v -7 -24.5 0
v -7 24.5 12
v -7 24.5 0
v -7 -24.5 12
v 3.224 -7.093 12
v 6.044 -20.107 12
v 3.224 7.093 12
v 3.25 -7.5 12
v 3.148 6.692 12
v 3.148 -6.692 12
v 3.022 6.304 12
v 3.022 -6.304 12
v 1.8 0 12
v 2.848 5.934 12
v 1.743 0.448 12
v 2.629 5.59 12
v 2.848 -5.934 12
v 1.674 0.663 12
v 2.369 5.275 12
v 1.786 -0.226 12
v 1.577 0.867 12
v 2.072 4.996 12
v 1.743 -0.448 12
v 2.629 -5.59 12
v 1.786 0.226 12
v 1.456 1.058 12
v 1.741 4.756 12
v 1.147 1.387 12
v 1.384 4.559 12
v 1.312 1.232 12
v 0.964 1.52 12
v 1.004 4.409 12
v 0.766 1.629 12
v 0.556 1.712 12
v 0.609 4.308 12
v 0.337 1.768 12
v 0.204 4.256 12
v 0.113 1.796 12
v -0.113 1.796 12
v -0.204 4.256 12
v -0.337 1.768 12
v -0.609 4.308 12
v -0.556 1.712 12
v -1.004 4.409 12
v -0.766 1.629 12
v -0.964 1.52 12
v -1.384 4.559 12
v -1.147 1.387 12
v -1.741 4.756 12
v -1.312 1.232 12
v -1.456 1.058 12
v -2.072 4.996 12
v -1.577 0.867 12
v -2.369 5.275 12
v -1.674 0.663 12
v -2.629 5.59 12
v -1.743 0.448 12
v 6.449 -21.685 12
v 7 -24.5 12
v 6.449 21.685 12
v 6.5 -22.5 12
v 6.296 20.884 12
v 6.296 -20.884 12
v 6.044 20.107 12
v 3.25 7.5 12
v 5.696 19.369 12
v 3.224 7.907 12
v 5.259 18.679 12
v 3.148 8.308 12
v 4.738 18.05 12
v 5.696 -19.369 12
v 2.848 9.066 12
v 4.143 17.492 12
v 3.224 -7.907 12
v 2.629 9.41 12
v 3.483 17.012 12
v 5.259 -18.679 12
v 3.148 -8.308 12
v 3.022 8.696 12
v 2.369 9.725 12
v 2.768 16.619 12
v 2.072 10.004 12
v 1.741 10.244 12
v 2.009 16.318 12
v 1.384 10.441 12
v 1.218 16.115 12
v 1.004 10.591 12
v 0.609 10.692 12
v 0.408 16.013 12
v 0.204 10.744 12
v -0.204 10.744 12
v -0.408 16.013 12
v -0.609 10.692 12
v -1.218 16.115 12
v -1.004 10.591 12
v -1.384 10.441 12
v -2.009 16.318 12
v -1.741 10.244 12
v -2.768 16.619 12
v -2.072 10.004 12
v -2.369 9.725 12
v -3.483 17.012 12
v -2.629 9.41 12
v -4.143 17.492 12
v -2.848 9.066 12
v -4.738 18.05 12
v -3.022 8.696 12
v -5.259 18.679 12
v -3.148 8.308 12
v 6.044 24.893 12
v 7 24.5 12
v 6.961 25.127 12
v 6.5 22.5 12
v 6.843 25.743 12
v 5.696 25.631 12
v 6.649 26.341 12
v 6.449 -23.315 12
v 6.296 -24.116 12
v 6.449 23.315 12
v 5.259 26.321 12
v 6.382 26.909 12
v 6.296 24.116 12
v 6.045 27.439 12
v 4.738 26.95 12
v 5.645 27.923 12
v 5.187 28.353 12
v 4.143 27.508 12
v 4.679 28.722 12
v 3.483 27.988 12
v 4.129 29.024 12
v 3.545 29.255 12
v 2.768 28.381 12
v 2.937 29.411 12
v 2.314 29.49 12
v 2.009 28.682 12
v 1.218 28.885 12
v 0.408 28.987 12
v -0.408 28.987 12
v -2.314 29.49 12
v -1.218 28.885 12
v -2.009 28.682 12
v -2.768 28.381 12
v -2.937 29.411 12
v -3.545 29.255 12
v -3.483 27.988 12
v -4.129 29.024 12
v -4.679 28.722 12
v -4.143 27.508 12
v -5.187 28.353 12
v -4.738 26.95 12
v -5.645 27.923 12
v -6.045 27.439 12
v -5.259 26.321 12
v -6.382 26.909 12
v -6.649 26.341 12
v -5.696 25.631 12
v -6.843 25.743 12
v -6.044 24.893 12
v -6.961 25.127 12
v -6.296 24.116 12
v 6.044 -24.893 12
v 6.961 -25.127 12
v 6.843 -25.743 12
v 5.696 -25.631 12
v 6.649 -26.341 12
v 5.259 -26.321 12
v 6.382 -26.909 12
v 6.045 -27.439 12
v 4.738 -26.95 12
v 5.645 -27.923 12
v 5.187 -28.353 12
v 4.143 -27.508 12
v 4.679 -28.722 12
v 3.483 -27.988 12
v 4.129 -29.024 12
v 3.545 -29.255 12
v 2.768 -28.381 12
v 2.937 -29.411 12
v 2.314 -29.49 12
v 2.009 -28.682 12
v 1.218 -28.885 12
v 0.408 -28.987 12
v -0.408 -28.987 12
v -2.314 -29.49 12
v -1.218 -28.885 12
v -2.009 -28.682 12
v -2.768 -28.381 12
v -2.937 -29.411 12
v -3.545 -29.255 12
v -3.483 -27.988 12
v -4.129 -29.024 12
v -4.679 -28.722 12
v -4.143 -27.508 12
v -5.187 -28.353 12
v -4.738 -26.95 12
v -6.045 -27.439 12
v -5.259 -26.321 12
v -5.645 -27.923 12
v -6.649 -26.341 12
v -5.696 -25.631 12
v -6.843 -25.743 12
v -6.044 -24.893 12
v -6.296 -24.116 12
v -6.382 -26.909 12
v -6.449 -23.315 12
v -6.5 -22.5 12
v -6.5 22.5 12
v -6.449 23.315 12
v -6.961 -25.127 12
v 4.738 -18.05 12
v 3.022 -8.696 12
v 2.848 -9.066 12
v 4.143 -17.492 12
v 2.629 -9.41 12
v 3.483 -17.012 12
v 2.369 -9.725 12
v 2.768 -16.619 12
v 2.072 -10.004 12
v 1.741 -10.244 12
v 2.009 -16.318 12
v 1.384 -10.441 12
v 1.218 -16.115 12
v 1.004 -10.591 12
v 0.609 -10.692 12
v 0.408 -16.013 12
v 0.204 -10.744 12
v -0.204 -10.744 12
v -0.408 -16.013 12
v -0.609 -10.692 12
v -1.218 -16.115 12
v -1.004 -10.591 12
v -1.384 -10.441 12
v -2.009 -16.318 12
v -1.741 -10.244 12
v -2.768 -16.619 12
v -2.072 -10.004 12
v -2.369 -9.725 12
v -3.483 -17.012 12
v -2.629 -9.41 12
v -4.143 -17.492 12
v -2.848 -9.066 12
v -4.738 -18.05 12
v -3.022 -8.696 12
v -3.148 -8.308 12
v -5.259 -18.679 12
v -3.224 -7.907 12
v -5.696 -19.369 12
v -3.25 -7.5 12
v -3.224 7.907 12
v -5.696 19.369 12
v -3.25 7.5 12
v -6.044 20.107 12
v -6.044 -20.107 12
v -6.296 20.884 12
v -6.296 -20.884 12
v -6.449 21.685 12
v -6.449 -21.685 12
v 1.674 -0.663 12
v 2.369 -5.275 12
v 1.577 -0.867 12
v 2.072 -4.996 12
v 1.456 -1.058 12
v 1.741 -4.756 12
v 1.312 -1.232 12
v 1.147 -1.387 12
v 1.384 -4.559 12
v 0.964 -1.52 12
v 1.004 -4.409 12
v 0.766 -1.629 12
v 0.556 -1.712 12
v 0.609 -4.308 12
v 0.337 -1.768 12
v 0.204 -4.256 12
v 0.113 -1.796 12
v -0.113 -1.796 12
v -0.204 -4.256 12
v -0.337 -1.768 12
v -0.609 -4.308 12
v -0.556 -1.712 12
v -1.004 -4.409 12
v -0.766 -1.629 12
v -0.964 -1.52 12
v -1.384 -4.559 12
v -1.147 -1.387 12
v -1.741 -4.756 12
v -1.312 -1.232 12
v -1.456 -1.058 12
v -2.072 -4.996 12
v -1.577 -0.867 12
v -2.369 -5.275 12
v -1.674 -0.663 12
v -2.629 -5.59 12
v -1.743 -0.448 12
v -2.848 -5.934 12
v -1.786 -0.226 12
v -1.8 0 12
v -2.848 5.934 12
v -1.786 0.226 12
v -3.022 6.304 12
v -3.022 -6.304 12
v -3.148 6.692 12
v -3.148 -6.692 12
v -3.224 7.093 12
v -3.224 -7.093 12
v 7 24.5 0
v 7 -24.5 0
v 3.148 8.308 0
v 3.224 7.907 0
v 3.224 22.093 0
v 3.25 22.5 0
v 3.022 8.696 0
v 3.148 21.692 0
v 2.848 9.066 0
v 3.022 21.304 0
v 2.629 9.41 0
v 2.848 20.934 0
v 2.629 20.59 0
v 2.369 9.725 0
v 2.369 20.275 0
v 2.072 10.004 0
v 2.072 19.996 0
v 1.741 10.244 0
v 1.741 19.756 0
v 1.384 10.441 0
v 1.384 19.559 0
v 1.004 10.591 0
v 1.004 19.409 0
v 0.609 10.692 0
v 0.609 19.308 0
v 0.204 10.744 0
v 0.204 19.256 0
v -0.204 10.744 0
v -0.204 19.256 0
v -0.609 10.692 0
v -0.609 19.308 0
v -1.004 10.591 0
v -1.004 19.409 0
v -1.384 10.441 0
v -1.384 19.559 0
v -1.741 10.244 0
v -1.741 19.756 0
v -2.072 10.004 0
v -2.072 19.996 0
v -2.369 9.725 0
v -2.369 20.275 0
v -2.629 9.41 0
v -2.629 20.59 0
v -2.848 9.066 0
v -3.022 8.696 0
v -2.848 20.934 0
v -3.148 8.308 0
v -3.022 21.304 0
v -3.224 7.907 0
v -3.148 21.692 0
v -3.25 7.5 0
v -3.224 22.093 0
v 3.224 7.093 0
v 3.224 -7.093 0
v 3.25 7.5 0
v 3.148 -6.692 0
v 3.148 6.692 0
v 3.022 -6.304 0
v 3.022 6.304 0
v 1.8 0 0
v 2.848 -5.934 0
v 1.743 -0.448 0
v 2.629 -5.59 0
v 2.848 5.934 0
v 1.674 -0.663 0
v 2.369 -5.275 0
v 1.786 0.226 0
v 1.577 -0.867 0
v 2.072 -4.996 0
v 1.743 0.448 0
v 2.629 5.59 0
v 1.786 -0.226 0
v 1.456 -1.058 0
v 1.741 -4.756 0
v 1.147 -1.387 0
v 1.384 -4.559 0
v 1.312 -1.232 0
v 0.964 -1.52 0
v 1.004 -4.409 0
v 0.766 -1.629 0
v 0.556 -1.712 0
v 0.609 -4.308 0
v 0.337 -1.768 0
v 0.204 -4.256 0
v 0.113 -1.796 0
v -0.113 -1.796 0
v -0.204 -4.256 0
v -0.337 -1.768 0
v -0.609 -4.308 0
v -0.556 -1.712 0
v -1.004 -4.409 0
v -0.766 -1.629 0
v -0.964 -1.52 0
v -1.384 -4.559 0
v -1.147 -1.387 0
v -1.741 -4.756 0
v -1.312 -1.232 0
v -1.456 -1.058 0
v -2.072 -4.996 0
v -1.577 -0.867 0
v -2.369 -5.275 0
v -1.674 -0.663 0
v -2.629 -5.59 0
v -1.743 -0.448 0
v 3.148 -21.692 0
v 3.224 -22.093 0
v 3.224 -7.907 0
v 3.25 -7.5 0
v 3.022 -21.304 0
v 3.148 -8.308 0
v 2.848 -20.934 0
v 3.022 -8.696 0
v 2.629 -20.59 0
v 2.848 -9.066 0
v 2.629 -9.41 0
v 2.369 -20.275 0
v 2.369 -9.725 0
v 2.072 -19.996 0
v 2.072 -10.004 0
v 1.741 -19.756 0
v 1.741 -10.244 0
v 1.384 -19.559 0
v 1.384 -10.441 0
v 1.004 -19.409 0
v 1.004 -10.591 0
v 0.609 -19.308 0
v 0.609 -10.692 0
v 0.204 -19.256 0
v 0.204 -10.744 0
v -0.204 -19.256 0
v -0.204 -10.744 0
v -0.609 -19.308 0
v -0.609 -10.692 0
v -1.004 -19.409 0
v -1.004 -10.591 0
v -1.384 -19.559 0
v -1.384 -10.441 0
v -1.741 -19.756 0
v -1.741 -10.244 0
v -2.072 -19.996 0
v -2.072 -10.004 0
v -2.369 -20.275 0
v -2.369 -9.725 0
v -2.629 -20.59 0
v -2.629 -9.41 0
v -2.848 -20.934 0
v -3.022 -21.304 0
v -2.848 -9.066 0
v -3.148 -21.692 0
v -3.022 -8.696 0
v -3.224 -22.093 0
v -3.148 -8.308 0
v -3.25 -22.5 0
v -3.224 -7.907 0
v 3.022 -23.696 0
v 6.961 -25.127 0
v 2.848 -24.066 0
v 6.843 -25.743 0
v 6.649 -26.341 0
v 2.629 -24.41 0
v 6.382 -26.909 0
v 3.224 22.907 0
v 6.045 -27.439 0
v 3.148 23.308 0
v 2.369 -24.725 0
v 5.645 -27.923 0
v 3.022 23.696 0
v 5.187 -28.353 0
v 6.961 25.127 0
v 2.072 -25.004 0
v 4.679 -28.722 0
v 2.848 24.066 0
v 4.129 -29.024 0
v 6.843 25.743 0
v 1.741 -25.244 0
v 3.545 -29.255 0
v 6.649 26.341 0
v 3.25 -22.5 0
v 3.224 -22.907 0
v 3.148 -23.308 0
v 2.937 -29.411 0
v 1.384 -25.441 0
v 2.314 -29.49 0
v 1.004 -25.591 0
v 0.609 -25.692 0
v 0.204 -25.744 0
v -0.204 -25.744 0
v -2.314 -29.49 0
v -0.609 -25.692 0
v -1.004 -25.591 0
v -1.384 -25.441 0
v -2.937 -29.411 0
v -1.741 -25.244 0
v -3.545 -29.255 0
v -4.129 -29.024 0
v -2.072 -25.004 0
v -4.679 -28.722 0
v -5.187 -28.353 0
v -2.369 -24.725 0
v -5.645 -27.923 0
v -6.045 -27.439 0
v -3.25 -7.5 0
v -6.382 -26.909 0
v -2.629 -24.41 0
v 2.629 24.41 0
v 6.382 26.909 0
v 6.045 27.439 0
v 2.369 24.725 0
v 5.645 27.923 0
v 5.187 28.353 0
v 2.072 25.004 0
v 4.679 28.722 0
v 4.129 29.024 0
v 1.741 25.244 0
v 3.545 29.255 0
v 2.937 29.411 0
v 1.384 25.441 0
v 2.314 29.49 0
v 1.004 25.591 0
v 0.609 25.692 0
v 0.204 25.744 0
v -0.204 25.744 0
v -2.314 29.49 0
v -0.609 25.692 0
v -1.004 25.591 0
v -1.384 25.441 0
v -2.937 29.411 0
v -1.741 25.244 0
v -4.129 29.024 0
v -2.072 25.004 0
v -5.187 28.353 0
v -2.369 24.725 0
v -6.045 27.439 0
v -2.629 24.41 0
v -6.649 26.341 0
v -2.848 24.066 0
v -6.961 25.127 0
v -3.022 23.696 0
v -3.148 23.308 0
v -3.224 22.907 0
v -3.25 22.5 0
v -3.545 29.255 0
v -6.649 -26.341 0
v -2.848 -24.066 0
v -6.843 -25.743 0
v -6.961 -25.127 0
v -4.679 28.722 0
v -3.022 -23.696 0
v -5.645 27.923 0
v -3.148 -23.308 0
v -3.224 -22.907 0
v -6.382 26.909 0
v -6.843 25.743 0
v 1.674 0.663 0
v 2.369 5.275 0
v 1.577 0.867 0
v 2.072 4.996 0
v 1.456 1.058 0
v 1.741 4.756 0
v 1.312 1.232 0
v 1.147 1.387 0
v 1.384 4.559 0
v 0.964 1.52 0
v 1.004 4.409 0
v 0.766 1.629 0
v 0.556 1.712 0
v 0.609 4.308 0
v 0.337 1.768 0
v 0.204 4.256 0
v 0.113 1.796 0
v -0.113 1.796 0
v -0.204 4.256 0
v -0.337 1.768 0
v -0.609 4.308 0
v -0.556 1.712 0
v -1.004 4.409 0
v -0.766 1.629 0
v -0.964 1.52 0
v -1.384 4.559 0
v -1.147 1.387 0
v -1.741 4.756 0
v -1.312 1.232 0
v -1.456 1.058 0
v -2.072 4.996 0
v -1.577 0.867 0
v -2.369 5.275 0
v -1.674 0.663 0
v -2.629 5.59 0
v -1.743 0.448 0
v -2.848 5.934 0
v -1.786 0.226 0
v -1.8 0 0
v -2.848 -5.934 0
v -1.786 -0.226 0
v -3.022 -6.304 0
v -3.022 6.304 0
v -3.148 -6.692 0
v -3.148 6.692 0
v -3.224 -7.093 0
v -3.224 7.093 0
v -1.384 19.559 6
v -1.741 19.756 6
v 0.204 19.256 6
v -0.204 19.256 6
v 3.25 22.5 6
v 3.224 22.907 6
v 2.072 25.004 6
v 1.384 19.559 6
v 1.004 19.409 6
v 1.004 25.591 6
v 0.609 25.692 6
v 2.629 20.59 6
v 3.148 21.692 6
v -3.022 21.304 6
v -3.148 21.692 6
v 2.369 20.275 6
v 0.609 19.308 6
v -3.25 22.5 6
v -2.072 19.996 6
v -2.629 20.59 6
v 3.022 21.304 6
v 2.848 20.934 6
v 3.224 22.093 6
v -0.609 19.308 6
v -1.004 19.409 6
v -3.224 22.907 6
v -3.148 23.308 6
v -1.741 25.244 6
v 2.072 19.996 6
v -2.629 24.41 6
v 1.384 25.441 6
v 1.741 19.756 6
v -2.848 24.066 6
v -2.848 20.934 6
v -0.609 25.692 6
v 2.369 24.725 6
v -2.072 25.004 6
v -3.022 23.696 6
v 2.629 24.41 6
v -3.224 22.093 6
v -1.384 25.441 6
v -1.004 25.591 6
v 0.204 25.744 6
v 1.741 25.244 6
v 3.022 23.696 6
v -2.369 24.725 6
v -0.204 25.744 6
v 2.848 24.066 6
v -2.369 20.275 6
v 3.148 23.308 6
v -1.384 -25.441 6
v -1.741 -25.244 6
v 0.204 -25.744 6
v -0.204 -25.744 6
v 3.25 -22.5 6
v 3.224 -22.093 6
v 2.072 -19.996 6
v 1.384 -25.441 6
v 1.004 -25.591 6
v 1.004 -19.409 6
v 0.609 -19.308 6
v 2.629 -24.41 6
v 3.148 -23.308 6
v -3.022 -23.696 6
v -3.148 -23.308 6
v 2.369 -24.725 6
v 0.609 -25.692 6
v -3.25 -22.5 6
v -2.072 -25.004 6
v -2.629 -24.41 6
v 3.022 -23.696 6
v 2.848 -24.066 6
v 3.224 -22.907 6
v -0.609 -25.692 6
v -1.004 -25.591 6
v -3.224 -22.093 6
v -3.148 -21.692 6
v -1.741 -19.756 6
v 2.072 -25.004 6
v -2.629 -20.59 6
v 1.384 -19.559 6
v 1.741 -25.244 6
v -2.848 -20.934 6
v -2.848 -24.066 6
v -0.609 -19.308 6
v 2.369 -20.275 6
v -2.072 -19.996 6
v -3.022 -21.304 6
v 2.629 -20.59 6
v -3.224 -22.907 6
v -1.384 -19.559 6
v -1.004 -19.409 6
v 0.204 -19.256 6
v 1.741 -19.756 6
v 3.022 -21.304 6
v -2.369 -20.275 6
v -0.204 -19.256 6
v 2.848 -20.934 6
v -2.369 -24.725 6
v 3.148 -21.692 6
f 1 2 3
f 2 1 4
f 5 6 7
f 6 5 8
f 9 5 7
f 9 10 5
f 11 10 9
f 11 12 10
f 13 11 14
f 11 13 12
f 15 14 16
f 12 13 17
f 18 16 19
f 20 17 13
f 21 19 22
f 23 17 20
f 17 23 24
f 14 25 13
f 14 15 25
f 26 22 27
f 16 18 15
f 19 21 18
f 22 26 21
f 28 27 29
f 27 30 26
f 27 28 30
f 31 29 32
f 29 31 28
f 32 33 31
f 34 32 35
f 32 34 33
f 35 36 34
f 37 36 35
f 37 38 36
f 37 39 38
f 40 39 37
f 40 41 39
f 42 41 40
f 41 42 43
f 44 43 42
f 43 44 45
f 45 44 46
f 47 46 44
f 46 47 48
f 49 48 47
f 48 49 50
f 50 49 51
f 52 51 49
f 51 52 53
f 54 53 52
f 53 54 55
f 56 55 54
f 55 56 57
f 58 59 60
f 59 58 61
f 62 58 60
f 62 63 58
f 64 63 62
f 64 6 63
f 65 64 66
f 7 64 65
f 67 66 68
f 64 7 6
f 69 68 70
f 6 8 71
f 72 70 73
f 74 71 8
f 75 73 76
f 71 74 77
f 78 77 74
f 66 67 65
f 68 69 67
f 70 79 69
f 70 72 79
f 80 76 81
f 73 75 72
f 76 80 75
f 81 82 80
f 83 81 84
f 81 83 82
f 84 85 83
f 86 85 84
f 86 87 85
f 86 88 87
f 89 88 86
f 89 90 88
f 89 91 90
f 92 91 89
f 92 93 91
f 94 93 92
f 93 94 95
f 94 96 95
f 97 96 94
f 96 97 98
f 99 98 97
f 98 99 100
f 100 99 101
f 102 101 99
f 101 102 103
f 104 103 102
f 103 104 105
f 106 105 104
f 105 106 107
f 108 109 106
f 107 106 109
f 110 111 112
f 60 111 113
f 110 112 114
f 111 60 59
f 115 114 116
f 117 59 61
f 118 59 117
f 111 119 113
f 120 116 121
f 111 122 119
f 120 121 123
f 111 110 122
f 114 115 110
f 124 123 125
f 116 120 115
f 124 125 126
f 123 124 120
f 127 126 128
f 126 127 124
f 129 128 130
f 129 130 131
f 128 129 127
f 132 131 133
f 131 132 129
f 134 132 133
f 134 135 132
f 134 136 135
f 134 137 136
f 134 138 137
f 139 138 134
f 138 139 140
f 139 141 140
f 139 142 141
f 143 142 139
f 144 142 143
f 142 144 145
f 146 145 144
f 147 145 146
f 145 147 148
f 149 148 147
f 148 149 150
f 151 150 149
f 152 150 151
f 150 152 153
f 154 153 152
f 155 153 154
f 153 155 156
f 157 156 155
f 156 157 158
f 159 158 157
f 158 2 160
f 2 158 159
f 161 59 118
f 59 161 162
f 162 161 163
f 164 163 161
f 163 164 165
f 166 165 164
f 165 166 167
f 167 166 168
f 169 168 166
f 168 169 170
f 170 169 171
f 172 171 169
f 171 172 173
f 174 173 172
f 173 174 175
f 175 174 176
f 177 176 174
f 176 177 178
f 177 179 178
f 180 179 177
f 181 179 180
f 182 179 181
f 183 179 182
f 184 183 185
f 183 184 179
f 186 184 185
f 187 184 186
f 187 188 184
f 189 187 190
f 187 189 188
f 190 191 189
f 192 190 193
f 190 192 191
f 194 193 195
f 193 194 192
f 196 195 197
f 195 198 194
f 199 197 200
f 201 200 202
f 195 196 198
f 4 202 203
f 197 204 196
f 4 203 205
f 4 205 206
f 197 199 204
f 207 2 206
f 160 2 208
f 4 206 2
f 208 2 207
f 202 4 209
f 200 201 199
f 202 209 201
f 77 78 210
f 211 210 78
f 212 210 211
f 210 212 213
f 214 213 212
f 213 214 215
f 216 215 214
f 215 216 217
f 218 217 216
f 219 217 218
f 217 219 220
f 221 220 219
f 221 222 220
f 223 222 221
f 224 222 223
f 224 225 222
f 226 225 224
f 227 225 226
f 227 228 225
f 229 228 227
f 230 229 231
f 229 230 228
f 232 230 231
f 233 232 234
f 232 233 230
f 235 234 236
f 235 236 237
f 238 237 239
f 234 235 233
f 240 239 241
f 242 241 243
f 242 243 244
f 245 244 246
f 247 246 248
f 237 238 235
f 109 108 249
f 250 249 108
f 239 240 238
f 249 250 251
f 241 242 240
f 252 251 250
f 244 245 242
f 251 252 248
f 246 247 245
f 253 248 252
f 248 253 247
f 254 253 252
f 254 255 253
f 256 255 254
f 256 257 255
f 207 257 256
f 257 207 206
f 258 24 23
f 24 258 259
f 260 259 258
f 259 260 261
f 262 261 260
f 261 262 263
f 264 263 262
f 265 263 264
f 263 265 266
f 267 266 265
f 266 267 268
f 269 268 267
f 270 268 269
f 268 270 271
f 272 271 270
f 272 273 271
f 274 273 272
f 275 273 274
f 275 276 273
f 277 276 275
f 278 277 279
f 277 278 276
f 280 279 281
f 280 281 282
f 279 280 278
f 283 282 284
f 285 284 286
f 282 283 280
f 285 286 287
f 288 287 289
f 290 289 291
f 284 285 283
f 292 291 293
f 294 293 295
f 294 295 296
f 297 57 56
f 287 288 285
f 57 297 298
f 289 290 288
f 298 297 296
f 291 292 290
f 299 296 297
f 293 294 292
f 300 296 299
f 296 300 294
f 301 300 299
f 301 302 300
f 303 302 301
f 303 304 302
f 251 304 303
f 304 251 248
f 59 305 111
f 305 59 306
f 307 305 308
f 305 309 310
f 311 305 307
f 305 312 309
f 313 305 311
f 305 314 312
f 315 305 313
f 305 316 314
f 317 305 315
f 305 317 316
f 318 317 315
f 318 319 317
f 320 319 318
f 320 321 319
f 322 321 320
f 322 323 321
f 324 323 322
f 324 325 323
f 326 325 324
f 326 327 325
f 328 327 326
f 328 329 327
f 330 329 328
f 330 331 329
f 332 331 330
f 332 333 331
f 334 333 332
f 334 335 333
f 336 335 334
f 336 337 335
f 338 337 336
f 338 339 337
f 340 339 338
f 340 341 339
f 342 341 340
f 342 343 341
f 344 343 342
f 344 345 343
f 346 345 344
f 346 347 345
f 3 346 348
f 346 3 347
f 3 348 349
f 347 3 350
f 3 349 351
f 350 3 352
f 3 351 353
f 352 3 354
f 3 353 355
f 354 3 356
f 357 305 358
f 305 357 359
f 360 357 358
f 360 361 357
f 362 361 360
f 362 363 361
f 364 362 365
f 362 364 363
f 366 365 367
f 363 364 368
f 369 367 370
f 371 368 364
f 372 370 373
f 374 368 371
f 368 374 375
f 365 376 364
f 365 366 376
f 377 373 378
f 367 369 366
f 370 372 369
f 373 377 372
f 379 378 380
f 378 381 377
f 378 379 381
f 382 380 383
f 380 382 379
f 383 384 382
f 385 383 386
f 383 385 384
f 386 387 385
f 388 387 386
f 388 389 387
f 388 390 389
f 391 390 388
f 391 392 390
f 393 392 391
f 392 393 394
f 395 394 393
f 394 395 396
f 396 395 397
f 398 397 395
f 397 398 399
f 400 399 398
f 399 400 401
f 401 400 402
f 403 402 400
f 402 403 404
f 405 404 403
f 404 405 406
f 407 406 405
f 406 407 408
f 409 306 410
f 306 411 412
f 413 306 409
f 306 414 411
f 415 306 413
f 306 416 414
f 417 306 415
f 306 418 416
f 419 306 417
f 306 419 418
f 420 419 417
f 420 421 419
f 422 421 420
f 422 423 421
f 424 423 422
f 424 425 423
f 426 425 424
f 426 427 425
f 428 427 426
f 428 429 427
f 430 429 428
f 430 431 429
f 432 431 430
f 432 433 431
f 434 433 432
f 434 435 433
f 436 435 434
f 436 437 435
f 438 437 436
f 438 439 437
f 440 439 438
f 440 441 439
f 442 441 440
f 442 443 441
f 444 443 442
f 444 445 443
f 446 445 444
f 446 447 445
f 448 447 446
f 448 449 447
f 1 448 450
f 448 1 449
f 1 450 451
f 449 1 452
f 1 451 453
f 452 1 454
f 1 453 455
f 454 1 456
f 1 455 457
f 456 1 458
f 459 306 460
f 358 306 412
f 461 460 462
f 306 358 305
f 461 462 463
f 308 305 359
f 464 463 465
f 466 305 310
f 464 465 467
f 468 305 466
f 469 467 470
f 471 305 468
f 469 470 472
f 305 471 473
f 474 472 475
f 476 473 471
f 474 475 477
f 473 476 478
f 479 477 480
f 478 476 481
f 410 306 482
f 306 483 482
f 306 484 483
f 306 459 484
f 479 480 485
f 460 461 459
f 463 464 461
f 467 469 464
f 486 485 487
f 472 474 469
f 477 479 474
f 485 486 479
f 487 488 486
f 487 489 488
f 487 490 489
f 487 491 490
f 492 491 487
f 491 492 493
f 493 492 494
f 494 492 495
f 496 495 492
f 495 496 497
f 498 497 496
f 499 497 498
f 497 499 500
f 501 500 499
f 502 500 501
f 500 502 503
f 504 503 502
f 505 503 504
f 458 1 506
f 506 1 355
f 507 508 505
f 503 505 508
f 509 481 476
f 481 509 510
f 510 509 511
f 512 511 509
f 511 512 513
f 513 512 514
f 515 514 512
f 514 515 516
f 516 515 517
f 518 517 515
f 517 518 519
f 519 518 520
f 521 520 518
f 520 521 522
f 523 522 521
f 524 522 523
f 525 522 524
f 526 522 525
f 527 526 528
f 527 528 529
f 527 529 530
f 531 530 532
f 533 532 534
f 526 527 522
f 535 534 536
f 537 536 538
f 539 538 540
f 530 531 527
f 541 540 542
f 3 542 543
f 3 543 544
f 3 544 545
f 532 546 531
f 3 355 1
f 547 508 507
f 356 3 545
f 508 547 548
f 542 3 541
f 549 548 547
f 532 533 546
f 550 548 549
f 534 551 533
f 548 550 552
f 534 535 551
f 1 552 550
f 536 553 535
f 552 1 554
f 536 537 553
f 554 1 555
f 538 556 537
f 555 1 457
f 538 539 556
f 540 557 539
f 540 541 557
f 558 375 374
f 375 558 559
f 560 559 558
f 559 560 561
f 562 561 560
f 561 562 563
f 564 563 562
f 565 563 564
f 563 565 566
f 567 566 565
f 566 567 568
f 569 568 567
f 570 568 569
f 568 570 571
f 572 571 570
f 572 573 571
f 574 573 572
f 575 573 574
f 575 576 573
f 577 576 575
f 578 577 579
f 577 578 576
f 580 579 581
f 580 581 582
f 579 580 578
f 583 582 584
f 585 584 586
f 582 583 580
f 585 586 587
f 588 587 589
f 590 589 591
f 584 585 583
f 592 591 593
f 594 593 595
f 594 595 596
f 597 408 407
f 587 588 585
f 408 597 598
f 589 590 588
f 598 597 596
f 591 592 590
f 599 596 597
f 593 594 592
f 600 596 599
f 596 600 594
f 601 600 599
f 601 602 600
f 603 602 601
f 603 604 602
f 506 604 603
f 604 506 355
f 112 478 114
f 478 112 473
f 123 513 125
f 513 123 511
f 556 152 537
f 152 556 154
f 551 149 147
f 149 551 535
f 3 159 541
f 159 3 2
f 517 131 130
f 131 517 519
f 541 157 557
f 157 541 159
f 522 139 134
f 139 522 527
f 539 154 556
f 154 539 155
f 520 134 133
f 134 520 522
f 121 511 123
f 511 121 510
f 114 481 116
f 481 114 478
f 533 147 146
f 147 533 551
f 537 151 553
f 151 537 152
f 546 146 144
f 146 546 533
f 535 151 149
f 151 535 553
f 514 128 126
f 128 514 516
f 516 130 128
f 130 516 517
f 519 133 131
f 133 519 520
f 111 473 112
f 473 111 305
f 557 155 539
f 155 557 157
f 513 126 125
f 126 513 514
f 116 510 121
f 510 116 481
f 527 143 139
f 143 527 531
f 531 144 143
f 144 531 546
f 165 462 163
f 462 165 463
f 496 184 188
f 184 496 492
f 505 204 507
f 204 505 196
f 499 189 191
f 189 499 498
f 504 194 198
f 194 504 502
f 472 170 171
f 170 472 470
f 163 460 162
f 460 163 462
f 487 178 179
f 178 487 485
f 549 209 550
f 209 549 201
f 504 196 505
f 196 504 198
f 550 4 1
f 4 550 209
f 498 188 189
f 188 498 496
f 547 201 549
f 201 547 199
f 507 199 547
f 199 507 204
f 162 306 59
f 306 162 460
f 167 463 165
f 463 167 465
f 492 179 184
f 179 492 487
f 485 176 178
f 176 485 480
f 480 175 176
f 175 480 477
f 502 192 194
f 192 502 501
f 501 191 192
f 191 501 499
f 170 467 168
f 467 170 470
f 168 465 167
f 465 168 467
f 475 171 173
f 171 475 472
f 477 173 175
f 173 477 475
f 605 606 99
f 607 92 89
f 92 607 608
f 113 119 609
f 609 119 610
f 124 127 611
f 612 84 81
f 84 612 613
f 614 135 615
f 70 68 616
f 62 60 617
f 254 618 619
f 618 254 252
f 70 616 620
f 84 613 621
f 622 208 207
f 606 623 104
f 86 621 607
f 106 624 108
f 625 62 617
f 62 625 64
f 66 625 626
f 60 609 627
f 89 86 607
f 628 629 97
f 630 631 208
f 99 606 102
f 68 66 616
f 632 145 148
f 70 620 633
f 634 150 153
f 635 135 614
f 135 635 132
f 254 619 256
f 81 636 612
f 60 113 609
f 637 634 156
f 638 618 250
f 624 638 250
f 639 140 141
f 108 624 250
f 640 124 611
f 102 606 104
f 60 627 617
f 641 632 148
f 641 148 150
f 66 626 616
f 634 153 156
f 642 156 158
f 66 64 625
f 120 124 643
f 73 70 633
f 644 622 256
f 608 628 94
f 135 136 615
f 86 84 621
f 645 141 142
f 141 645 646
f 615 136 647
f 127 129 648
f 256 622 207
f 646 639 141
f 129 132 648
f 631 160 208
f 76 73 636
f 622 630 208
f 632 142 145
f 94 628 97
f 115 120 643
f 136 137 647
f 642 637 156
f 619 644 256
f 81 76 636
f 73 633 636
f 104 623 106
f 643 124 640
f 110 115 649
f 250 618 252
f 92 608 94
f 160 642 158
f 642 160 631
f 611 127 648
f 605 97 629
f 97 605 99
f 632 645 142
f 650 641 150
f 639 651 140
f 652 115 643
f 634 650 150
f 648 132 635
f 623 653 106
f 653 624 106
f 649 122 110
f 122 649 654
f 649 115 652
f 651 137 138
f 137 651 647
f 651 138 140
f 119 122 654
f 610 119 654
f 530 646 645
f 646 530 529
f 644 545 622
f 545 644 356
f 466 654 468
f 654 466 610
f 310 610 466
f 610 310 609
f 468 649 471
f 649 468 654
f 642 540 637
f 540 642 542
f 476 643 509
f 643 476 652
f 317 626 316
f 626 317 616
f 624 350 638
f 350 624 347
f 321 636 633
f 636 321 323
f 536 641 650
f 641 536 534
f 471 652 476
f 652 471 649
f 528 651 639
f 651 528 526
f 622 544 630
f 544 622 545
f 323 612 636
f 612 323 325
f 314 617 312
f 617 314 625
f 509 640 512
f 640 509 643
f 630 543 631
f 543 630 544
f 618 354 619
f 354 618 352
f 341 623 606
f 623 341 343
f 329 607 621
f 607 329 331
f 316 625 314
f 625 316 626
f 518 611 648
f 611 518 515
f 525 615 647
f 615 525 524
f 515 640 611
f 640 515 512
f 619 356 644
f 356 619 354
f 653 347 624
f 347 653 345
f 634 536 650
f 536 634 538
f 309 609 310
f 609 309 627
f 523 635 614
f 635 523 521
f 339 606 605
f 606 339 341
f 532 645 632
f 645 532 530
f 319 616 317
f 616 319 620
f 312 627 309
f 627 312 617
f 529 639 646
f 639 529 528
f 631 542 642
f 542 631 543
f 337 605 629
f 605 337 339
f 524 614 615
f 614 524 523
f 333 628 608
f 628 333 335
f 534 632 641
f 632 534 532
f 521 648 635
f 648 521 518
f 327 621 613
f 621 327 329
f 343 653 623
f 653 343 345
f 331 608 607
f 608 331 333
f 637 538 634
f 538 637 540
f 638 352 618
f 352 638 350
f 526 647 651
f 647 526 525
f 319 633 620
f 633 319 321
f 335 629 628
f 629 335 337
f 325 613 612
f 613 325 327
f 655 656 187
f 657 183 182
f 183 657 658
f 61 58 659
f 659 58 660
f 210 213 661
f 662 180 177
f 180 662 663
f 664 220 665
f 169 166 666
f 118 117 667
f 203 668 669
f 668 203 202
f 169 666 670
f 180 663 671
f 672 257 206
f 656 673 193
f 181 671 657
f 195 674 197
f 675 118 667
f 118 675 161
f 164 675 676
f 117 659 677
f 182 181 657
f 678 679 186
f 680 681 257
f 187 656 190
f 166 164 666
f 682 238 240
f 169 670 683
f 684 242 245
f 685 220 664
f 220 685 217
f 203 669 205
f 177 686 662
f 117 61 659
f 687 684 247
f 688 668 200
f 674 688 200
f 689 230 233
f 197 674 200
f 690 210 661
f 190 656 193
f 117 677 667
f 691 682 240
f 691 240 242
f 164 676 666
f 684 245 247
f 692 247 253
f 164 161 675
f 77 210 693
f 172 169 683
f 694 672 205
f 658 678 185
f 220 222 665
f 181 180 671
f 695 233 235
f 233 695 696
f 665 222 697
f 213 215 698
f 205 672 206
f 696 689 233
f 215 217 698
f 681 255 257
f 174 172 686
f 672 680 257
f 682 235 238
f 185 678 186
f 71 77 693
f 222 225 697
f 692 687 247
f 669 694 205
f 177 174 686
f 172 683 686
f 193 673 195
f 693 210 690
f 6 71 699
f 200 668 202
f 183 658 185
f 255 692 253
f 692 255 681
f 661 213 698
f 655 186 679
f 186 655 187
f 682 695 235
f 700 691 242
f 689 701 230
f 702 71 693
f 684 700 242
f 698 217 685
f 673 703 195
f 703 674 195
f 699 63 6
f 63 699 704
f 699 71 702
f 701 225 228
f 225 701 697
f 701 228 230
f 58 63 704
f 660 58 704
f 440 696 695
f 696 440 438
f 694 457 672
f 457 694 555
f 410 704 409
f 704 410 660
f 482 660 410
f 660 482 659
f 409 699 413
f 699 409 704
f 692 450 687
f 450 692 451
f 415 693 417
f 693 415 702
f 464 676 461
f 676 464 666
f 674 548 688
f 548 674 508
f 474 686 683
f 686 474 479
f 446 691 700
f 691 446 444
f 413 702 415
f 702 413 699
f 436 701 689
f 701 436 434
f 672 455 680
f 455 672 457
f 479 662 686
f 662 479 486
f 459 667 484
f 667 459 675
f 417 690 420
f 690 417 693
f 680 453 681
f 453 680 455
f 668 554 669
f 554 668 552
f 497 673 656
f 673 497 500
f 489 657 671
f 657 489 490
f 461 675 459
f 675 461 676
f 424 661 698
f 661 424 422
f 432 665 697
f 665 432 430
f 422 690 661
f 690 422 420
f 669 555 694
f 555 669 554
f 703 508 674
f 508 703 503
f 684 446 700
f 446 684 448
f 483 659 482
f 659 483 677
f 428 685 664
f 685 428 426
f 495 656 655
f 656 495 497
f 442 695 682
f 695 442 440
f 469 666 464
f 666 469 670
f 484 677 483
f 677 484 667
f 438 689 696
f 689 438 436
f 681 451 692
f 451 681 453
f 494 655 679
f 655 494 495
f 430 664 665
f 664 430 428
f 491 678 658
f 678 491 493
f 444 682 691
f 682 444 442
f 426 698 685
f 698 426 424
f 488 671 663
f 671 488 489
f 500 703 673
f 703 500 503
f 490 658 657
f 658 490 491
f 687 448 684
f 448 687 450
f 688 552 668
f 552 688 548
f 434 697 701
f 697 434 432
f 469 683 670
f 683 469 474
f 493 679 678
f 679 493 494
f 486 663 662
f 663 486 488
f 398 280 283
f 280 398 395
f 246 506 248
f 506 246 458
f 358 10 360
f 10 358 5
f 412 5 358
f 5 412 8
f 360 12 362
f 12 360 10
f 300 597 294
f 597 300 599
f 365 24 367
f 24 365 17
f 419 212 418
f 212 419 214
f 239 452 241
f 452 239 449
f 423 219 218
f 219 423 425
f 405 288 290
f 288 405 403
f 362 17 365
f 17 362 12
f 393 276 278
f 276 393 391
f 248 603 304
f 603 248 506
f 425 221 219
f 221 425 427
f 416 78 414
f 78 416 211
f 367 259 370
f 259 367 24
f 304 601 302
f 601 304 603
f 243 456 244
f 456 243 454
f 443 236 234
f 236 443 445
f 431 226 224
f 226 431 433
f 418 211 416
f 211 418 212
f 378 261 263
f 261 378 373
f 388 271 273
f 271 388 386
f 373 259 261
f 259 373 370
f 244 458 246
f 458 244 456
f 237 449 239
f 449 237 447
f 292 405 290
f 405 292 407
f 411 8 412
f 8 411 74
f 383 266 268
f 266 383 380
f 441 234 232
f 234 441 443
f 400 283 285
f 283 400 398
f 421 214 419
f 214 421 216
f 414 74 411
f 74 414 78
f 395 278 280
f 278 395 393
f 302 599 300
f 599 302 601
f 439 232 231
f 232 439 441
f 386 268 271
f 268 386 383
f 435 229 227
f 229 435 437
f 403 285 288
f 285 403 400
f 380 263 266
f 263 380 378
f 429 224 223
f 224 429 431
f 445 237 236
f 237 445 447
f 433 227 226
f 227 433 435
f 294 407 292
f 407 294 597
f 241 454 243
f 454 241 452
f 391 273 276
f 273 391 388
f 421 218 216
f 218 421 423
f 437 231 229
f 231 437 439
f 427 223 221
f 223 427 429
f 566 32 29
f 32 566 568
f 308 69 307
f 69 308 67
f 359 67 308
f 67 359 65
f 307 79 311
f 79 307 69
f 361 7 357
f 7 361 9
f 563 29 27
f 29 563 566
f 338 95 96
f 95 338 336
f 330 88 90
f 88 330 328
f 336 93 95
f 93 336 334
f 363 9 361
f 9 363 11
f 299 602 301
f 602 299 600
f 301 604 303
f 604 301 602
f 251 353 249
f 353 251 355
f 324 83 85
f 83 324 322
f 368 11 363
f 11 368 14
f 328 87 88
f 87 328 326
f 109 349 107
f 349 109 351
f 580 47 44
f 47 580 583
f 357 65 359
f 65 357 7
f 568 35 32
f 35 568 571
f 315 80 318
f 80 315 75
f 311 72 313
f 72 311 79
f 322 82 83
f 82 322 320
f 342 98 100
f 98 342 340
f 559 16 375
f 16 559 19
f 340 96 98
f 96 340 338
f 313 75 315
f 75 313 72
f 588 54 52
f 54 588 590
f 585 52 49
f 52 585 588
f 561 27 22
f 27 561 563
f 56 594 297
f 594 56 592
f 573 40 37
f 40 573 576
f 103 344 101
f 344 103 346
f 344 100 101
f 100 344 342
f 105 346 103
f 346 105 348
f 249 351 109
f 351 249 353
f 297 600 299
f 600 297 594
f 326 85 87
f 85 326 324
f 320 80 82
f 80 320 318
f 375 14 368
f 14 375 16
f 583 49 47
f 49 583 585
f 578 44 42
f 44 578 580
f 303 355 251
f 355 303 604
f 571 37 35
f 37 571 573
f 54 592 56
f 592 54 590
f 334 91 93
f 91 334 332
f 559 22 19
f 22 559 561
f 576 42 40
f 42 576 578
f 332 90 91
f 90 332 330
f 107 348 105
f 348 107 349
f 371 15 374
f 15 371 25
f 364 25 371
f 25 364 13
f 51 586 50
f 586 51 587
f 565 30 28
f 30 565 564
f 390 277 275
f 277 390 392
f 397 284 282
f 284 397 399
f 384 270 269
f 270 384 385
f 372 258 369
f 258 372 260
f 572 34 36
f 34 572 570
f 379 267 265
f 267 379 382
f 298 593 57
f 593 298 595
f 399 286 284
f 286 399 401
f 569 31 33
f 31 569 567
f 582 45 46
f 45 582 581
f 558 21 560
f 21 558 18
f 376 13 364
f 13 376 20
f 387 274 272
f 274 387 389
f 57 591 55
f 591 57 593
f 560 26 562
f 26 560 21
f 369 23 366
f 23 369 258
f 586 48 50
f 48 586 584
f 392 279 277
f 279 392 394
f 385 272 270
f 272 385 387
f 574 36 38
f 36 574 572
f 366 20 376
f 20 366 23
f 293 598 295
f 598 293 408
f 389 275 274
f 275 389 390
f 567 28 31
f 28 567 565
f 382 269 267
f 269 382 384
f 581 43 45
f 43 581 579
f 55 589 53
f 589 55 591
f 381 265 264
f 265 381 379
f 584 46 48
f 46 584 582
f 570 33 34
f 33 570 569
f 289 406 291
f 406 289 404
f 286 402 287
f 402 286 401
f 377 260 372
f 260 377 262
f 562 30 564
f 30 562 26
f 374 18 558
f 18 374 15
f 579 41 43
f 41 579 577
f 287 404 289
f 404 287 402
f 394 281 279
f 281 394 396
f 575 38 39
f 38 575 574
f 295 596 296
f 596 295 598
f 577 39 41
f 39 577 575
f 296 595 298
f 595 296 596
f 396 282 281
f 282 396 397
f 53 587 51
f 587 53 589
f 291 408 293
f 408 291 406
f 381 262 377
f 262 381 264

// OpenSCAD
$fn = 50;


difference() {
	union() {
		hull() {
			translate(v = [-2.0000000000, 9.5000000000, 0]) {
				cylinder(h = 12, r = 5);
			}
			translate(v = [2.0000000000, 9.5000000000, 0]) {
				cylinder(h = 12, r = 5);
			}
			translate(v = [-2.0000000000, -9.5000000000, 0]) {
				cylinder(h = 12, r = 5);
			}
			translate(v = [2.0000000000, -9.5000000000, 0]) {
				cylinder(h = 12, r = 5);
			}
		}
		translate(v = [0.0000000000, 15.0000000000, 0]) {
			hull() {
				translate(v = [-2.0000000000, 9.5000000000, 0]) {
					cylinder(h = 12, r = 5);
				}
				translate(v = [2.0000000000, 9.5000000000, 0]) {
					cylinder(h = 12, r = 5);
				}
				translate(v = [-2.0000000000, -9.5000000000, 0]) {
					cylinder(h = 12, r = 5);
				}
				translate(v = [2.0000000000, -9.5000000000, 0]) {
					cylinder(h = 12, r = 5);
				}
			}
		}
		translate(v = [0.0000000000, 15.0000000000, 0]) {
			hull() {
				translate(v = [-2.0000000000, 9.5000000000, 0]) {
					cylinder(h = 12, r = 5);
				}
				translate(v = [2.0000000000, 9.5000000000, 0]) {
					cylinder(h = 12, r = 5);
				}
				translate(v = [-2.0000000000, -9.5000000000, 0]) {
					cylinder(h = 12, r = 5);
				}
				translate(v = [2.0000000000, -9.5000000000, 0]) {
					cylinder(h = 12, r = 5);
				}
			}
		}
		translate(v = [0.0000000000, -15.0000000000, 0]) {
			hull() {
				translate(v = [-2.0000000000, 9.5000000000, 0]) {
					cylinder(h = 12, r = 5);
				}
				translate(v = [2.0000000000, 9.5000000000, 0]) {
					cylinder(h = 12, r = 5);
				}
				translate(v = [-2.0000000000, -9.5000000000, 0]) {
					cylinder(h = 12, r = 5);
				}
				translate(v = [2.0000000000, -9.5000000000, 0]) {
					cylinder(h = 12, r = 5);
				}
			}
		}
		translate(v = [0.0000000000, -15.0000000000, 0]) {
			hull() {
				translate(v = [-2.0000000000, 9.5000000000, 0]) {
					cylinder(h = 12, r = 5);
				}
				translate(v = [2.0000000000, 9.5000000000, 0]) {
					cylinder(h = 12, r = 5);
				}
				translate(v = [-2.0000000000, -9.5000000000, 0]) {
					cylinder(h = 12, r = 5);
				}
				translate(v = [2.0000000000, -9.5000000000, 0]) {
					cylinder(h = 12, r = 5);
				}
			}
		}
	}
	union() {
		translate(v = [0.0000000000, 22.5000000000, 12]) {
			rotate(a = [0, 0, 0]) {
				difference() {
					union() {
						#translate(v = [0, 0, -12.0000000000]) {
							cylinder(h = 12, r = 2.2500000000);
						}
						#translate(v = [0, 0, -6]) {
							cylinder(h = 6, r1 = 3.2500000000, r2 = 6.5000000000);
						}
						#translate(v = [0, 0, -12.0000000000]) {
							cylinder(h = 12, r = 3.2500000000);
						}
						#translate(v = [0, 0, -12.0000000000]) {
							cylinder(h = 12, r = 2.2500000000);
						}
					}
					union();
				}
			}
		}
		translate(v = [0.0000000000, 22.5000000000, 12]) {
			rotate(a = [0, 0, 0]) {
				difference() {
					union() {
						#translate(v = [0, 0, -12.0000000000]) {
							cylinder(h = 12, r = 2.2500000000);
						}
						#translate(v = [0, 0, -6]) {
							cylinder(h = 6, r1 = 3.2500000000, r2 = 6.5000000000);
						}
						#translate(v = [0, 0, -12.0000000000]) {
							cylinder(h = 12, r = 3.2500000000);
						}
						#translate(v = [0, 0, -12.0000000000]) {
							cylinder(h = 12, r = 2.2500000000);
						}
					}
					union();
				}
			}
		}
		translate(v = [0.0000000000, -22.5000000000, 12]) {
			rotate(a = [0, 0, 0]) {
				difference() {
					union() {
						#translate(v = [0, 0, -12.0000000000]) {
							cylinder(h = 12, r = 2.2500000000);
						}
						#translate(v = [0, 0, -6]) {
							cylinder(h = 6, r1 = 3.2500000000, r2 = 6.5000000000);
						}
						#translate(v = [0, 0, -12.0000000000]) {
							cylinder(h = 12, r = 3.2500000000);
						}
						#translate(v = [0, 0, -12.0000000000]) {
							cylinder(h = 12, r = 2.2500000000);
						}
					}
					union();
				}
			}
		}
		translate(v = [0.0000000000, -22.5000000000, 12]) {
			rotate(a = [0, 0, 0]) {
				difference() {
					union() {
						#translate(v = [0, 0, -12.0000000000]) {
							cylinder(h = 12, r = 2.2500000000);
						}
						#translate(v = [0, 0, -6]) {
							cylinder(h = 6, r1 = 3.2500000000, r2 = 6.5000000000);
						}
						#translate(v = [0, 0, -12.0000000000]) {
							cylinder(h = 12, r = 3.2500000000);
						}
						#translate(v = [0, 0, -12.0000000000]) {
							cylinder(h = 12, r = 2.2500000000);
						}
					}
					union();
				}
			}
		}
		translate(v = [0.0000000000, -7.5000000000, 0]) {
			translate(v = [0, 0, -100]) {
				cylinder(h = 200, r = 3.2500000000);
			}
		}
		translate(v = [0.0000000000, 7.5000000000, 0]) {
			translate(v = [0, 0, -100]) {
				cylinder(h = 200, r = 3.2500000000);
			}
		}
		translate(v = [0.0000000000, -7.5000000000, 0]) {
			translate(v = [0, 0, -100]) {
				cylinder(h = 200, r = 1.8000000000);
			}
		}
		translate(v = [0, 0, -100]) {
			cylinder(h = 200, r = 1.8000000000);
		}
		translate(v = [0.0000000000, 7.5000000000, 0]) {
			translate(v = [0, 0, -100]) {
				cylinder(h = 200, r = 1.8000000000);
			}
		}
	}
}
